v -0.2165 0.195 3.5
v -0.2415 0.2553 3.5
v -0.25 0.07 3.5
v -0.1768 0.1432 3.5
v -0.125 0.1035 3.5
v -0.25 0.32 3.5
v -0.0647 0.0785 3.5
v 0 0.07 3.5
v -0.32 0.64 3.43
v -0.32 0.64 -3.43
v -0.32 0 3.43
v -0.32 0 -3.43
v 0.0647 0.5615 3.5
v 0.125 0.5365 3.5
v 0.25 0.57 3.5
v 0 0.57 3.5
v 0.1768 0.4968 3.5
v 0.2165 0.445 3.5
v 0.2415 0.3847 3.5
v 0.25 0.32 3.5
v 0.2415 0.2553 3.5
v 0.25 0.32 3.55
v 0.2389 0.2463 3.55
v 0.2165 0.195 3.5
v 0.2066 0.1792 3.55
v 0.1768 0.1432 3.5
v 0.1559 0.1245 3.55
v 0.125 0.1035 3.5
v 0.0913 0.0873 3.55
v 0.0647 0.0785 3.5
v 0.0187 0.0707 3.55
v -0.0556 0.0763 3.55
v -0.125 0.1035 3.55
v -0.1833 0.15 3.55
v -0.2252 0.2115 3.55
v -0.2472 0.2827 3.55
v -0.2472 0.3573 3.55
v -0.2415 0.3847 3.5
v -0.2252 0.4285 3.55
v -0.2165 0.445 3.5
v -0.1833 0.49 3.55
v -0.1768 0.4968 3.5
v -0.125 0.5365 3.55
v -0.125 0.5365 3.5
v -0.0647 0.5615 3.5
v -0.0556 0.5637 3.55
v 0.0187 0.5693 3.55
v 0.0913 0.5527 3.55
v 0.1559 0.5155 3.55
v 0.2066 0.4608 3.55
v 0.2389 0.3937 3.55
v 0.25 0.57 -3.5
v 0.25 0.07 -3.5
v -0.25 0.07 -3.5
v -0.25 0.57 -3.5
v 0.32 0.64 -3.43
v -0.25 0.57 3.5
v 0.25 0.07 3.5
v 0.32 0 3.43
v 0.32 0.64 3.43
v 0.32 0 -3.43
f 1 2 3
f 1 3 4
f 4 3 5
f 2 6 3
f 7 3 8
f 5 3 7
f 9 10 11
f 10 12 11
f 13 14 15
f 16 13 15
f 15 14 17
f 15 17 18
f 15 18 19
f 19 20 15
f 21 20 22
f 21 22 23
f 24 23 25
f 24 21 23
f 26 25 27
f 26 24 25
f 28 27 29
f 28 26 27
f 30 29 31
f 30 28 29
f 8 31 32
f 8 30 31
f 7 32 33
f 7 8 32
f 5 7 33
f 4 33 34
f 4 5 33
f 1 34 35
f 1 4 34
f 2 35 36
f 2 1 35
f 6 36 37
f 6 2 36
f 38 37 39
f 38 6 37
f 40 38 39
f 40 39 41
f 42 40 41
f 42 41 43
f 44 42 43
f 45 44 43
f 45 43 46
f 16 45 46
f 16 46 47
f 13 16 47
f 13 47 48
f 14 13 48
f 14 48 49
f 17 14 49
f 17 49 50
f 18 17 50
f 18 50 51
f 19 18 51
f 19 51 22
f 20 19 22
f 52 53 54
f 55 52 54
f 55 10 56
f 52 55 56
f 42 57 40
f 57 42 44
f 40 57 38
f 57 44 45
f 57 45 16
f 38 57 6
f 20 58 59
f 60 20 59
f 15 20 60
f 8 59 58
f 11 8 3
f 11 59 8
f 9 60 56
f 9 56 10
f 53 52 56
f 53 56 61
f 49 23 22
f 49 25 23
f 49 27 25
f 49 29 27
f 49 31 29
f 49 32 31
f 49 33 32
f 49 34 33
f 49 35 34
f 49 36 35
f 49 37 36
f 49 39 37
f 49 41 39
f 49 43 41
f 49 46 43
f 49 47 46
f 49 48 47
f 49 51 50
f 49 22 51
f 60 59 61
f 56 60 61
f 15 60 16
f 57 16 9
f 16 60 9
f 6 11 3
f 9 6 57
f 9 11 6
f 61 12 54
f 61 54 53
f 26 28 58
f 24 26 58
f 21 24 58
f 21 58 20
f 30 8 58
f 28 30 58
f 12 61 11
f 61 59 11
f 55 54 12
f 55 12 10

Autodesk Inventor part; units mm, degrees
ref_plane "YZ Plane" through (0, 0, 0) normal (1, 0, 0) x (0, 1, 0)
ref_plane "XZ Plane" through (0, 0, 0) normal (0, 1, 0) x (-1, 0, 0)
ref_plane "XY Plane" through (0, 0, 0) normal (0, 0, 1) x (1, 0, 0)
sketch "Skizze1" plane through (0, 0, 0) normal (0, 1, 0) x (-1, 0, 0)
  line L0 (-0.32, -3.5) -> (0.32, -3.5)
  line L1 (0.32, -3.5) -> (0.32, 3.5)
  line L2 (0.32, 3.5) -> (-0.32, 3.5)
  line L3 (-0.32, 3.5) -> (-0.32, -3.5)
  line L4 (-0.32, -3.5) -> (0.32, 3.5) construction
  line L5 (0.32, -3.5) -> (-0.32, 3.5) construction
  point P0 (0, 0)
  point P1 (0, -3.5)
  point P2 (0, 3.5)
  dimension "d0" = 0.64
  dimension "d1" = 7
extrude "Extrusion1" add sketch "Skizze1" along normal blind 0.64
chamfer "Fasen1" distance 0.07 angle 45 8 edges at (0, 0.64, 3.5) (0.32, 0.32, 3.5) (-0.32, 0.32, 3.5) (0, 0, 3.5) (0.32, 0.32, -3.5) (0, 0.64, -3.5) (-0.32, 0.32, -3.5) (0, 0, -3.5)
sketch "Skizze2" plane through (-0.25, 0.07, 3.5) normal (0, 0, 1) x (1, 0, 0)
  line L0 (0, 0.5) -> (0, 0) projected
  line L1 (0, 0) -> (0.5, 0) projected
  line L2 (0, 0.5) -> (0.5, 0)
  line L3 (0.5, 0) -> (0.5, 0.5) projected
  line L4 (0.5, 0) -> (0.5, 0.5)
  line L5 (0.5, 0.5) -> (0, 0)
  circle A0 centre (0.25, 0.25) radius 0.25
  line L6 (0.5, 0.5) -> (0, 0.5) projected
  point P0 (0.25, -0.07)
extrude "Extrusion2" add sketch "Skizze2" along normal blind 0.05 contours A0 L2 L5 | A0 L5 L2 | L5 L2 A0 | L5 A0 L2
properties part number "Pin_7mm"
